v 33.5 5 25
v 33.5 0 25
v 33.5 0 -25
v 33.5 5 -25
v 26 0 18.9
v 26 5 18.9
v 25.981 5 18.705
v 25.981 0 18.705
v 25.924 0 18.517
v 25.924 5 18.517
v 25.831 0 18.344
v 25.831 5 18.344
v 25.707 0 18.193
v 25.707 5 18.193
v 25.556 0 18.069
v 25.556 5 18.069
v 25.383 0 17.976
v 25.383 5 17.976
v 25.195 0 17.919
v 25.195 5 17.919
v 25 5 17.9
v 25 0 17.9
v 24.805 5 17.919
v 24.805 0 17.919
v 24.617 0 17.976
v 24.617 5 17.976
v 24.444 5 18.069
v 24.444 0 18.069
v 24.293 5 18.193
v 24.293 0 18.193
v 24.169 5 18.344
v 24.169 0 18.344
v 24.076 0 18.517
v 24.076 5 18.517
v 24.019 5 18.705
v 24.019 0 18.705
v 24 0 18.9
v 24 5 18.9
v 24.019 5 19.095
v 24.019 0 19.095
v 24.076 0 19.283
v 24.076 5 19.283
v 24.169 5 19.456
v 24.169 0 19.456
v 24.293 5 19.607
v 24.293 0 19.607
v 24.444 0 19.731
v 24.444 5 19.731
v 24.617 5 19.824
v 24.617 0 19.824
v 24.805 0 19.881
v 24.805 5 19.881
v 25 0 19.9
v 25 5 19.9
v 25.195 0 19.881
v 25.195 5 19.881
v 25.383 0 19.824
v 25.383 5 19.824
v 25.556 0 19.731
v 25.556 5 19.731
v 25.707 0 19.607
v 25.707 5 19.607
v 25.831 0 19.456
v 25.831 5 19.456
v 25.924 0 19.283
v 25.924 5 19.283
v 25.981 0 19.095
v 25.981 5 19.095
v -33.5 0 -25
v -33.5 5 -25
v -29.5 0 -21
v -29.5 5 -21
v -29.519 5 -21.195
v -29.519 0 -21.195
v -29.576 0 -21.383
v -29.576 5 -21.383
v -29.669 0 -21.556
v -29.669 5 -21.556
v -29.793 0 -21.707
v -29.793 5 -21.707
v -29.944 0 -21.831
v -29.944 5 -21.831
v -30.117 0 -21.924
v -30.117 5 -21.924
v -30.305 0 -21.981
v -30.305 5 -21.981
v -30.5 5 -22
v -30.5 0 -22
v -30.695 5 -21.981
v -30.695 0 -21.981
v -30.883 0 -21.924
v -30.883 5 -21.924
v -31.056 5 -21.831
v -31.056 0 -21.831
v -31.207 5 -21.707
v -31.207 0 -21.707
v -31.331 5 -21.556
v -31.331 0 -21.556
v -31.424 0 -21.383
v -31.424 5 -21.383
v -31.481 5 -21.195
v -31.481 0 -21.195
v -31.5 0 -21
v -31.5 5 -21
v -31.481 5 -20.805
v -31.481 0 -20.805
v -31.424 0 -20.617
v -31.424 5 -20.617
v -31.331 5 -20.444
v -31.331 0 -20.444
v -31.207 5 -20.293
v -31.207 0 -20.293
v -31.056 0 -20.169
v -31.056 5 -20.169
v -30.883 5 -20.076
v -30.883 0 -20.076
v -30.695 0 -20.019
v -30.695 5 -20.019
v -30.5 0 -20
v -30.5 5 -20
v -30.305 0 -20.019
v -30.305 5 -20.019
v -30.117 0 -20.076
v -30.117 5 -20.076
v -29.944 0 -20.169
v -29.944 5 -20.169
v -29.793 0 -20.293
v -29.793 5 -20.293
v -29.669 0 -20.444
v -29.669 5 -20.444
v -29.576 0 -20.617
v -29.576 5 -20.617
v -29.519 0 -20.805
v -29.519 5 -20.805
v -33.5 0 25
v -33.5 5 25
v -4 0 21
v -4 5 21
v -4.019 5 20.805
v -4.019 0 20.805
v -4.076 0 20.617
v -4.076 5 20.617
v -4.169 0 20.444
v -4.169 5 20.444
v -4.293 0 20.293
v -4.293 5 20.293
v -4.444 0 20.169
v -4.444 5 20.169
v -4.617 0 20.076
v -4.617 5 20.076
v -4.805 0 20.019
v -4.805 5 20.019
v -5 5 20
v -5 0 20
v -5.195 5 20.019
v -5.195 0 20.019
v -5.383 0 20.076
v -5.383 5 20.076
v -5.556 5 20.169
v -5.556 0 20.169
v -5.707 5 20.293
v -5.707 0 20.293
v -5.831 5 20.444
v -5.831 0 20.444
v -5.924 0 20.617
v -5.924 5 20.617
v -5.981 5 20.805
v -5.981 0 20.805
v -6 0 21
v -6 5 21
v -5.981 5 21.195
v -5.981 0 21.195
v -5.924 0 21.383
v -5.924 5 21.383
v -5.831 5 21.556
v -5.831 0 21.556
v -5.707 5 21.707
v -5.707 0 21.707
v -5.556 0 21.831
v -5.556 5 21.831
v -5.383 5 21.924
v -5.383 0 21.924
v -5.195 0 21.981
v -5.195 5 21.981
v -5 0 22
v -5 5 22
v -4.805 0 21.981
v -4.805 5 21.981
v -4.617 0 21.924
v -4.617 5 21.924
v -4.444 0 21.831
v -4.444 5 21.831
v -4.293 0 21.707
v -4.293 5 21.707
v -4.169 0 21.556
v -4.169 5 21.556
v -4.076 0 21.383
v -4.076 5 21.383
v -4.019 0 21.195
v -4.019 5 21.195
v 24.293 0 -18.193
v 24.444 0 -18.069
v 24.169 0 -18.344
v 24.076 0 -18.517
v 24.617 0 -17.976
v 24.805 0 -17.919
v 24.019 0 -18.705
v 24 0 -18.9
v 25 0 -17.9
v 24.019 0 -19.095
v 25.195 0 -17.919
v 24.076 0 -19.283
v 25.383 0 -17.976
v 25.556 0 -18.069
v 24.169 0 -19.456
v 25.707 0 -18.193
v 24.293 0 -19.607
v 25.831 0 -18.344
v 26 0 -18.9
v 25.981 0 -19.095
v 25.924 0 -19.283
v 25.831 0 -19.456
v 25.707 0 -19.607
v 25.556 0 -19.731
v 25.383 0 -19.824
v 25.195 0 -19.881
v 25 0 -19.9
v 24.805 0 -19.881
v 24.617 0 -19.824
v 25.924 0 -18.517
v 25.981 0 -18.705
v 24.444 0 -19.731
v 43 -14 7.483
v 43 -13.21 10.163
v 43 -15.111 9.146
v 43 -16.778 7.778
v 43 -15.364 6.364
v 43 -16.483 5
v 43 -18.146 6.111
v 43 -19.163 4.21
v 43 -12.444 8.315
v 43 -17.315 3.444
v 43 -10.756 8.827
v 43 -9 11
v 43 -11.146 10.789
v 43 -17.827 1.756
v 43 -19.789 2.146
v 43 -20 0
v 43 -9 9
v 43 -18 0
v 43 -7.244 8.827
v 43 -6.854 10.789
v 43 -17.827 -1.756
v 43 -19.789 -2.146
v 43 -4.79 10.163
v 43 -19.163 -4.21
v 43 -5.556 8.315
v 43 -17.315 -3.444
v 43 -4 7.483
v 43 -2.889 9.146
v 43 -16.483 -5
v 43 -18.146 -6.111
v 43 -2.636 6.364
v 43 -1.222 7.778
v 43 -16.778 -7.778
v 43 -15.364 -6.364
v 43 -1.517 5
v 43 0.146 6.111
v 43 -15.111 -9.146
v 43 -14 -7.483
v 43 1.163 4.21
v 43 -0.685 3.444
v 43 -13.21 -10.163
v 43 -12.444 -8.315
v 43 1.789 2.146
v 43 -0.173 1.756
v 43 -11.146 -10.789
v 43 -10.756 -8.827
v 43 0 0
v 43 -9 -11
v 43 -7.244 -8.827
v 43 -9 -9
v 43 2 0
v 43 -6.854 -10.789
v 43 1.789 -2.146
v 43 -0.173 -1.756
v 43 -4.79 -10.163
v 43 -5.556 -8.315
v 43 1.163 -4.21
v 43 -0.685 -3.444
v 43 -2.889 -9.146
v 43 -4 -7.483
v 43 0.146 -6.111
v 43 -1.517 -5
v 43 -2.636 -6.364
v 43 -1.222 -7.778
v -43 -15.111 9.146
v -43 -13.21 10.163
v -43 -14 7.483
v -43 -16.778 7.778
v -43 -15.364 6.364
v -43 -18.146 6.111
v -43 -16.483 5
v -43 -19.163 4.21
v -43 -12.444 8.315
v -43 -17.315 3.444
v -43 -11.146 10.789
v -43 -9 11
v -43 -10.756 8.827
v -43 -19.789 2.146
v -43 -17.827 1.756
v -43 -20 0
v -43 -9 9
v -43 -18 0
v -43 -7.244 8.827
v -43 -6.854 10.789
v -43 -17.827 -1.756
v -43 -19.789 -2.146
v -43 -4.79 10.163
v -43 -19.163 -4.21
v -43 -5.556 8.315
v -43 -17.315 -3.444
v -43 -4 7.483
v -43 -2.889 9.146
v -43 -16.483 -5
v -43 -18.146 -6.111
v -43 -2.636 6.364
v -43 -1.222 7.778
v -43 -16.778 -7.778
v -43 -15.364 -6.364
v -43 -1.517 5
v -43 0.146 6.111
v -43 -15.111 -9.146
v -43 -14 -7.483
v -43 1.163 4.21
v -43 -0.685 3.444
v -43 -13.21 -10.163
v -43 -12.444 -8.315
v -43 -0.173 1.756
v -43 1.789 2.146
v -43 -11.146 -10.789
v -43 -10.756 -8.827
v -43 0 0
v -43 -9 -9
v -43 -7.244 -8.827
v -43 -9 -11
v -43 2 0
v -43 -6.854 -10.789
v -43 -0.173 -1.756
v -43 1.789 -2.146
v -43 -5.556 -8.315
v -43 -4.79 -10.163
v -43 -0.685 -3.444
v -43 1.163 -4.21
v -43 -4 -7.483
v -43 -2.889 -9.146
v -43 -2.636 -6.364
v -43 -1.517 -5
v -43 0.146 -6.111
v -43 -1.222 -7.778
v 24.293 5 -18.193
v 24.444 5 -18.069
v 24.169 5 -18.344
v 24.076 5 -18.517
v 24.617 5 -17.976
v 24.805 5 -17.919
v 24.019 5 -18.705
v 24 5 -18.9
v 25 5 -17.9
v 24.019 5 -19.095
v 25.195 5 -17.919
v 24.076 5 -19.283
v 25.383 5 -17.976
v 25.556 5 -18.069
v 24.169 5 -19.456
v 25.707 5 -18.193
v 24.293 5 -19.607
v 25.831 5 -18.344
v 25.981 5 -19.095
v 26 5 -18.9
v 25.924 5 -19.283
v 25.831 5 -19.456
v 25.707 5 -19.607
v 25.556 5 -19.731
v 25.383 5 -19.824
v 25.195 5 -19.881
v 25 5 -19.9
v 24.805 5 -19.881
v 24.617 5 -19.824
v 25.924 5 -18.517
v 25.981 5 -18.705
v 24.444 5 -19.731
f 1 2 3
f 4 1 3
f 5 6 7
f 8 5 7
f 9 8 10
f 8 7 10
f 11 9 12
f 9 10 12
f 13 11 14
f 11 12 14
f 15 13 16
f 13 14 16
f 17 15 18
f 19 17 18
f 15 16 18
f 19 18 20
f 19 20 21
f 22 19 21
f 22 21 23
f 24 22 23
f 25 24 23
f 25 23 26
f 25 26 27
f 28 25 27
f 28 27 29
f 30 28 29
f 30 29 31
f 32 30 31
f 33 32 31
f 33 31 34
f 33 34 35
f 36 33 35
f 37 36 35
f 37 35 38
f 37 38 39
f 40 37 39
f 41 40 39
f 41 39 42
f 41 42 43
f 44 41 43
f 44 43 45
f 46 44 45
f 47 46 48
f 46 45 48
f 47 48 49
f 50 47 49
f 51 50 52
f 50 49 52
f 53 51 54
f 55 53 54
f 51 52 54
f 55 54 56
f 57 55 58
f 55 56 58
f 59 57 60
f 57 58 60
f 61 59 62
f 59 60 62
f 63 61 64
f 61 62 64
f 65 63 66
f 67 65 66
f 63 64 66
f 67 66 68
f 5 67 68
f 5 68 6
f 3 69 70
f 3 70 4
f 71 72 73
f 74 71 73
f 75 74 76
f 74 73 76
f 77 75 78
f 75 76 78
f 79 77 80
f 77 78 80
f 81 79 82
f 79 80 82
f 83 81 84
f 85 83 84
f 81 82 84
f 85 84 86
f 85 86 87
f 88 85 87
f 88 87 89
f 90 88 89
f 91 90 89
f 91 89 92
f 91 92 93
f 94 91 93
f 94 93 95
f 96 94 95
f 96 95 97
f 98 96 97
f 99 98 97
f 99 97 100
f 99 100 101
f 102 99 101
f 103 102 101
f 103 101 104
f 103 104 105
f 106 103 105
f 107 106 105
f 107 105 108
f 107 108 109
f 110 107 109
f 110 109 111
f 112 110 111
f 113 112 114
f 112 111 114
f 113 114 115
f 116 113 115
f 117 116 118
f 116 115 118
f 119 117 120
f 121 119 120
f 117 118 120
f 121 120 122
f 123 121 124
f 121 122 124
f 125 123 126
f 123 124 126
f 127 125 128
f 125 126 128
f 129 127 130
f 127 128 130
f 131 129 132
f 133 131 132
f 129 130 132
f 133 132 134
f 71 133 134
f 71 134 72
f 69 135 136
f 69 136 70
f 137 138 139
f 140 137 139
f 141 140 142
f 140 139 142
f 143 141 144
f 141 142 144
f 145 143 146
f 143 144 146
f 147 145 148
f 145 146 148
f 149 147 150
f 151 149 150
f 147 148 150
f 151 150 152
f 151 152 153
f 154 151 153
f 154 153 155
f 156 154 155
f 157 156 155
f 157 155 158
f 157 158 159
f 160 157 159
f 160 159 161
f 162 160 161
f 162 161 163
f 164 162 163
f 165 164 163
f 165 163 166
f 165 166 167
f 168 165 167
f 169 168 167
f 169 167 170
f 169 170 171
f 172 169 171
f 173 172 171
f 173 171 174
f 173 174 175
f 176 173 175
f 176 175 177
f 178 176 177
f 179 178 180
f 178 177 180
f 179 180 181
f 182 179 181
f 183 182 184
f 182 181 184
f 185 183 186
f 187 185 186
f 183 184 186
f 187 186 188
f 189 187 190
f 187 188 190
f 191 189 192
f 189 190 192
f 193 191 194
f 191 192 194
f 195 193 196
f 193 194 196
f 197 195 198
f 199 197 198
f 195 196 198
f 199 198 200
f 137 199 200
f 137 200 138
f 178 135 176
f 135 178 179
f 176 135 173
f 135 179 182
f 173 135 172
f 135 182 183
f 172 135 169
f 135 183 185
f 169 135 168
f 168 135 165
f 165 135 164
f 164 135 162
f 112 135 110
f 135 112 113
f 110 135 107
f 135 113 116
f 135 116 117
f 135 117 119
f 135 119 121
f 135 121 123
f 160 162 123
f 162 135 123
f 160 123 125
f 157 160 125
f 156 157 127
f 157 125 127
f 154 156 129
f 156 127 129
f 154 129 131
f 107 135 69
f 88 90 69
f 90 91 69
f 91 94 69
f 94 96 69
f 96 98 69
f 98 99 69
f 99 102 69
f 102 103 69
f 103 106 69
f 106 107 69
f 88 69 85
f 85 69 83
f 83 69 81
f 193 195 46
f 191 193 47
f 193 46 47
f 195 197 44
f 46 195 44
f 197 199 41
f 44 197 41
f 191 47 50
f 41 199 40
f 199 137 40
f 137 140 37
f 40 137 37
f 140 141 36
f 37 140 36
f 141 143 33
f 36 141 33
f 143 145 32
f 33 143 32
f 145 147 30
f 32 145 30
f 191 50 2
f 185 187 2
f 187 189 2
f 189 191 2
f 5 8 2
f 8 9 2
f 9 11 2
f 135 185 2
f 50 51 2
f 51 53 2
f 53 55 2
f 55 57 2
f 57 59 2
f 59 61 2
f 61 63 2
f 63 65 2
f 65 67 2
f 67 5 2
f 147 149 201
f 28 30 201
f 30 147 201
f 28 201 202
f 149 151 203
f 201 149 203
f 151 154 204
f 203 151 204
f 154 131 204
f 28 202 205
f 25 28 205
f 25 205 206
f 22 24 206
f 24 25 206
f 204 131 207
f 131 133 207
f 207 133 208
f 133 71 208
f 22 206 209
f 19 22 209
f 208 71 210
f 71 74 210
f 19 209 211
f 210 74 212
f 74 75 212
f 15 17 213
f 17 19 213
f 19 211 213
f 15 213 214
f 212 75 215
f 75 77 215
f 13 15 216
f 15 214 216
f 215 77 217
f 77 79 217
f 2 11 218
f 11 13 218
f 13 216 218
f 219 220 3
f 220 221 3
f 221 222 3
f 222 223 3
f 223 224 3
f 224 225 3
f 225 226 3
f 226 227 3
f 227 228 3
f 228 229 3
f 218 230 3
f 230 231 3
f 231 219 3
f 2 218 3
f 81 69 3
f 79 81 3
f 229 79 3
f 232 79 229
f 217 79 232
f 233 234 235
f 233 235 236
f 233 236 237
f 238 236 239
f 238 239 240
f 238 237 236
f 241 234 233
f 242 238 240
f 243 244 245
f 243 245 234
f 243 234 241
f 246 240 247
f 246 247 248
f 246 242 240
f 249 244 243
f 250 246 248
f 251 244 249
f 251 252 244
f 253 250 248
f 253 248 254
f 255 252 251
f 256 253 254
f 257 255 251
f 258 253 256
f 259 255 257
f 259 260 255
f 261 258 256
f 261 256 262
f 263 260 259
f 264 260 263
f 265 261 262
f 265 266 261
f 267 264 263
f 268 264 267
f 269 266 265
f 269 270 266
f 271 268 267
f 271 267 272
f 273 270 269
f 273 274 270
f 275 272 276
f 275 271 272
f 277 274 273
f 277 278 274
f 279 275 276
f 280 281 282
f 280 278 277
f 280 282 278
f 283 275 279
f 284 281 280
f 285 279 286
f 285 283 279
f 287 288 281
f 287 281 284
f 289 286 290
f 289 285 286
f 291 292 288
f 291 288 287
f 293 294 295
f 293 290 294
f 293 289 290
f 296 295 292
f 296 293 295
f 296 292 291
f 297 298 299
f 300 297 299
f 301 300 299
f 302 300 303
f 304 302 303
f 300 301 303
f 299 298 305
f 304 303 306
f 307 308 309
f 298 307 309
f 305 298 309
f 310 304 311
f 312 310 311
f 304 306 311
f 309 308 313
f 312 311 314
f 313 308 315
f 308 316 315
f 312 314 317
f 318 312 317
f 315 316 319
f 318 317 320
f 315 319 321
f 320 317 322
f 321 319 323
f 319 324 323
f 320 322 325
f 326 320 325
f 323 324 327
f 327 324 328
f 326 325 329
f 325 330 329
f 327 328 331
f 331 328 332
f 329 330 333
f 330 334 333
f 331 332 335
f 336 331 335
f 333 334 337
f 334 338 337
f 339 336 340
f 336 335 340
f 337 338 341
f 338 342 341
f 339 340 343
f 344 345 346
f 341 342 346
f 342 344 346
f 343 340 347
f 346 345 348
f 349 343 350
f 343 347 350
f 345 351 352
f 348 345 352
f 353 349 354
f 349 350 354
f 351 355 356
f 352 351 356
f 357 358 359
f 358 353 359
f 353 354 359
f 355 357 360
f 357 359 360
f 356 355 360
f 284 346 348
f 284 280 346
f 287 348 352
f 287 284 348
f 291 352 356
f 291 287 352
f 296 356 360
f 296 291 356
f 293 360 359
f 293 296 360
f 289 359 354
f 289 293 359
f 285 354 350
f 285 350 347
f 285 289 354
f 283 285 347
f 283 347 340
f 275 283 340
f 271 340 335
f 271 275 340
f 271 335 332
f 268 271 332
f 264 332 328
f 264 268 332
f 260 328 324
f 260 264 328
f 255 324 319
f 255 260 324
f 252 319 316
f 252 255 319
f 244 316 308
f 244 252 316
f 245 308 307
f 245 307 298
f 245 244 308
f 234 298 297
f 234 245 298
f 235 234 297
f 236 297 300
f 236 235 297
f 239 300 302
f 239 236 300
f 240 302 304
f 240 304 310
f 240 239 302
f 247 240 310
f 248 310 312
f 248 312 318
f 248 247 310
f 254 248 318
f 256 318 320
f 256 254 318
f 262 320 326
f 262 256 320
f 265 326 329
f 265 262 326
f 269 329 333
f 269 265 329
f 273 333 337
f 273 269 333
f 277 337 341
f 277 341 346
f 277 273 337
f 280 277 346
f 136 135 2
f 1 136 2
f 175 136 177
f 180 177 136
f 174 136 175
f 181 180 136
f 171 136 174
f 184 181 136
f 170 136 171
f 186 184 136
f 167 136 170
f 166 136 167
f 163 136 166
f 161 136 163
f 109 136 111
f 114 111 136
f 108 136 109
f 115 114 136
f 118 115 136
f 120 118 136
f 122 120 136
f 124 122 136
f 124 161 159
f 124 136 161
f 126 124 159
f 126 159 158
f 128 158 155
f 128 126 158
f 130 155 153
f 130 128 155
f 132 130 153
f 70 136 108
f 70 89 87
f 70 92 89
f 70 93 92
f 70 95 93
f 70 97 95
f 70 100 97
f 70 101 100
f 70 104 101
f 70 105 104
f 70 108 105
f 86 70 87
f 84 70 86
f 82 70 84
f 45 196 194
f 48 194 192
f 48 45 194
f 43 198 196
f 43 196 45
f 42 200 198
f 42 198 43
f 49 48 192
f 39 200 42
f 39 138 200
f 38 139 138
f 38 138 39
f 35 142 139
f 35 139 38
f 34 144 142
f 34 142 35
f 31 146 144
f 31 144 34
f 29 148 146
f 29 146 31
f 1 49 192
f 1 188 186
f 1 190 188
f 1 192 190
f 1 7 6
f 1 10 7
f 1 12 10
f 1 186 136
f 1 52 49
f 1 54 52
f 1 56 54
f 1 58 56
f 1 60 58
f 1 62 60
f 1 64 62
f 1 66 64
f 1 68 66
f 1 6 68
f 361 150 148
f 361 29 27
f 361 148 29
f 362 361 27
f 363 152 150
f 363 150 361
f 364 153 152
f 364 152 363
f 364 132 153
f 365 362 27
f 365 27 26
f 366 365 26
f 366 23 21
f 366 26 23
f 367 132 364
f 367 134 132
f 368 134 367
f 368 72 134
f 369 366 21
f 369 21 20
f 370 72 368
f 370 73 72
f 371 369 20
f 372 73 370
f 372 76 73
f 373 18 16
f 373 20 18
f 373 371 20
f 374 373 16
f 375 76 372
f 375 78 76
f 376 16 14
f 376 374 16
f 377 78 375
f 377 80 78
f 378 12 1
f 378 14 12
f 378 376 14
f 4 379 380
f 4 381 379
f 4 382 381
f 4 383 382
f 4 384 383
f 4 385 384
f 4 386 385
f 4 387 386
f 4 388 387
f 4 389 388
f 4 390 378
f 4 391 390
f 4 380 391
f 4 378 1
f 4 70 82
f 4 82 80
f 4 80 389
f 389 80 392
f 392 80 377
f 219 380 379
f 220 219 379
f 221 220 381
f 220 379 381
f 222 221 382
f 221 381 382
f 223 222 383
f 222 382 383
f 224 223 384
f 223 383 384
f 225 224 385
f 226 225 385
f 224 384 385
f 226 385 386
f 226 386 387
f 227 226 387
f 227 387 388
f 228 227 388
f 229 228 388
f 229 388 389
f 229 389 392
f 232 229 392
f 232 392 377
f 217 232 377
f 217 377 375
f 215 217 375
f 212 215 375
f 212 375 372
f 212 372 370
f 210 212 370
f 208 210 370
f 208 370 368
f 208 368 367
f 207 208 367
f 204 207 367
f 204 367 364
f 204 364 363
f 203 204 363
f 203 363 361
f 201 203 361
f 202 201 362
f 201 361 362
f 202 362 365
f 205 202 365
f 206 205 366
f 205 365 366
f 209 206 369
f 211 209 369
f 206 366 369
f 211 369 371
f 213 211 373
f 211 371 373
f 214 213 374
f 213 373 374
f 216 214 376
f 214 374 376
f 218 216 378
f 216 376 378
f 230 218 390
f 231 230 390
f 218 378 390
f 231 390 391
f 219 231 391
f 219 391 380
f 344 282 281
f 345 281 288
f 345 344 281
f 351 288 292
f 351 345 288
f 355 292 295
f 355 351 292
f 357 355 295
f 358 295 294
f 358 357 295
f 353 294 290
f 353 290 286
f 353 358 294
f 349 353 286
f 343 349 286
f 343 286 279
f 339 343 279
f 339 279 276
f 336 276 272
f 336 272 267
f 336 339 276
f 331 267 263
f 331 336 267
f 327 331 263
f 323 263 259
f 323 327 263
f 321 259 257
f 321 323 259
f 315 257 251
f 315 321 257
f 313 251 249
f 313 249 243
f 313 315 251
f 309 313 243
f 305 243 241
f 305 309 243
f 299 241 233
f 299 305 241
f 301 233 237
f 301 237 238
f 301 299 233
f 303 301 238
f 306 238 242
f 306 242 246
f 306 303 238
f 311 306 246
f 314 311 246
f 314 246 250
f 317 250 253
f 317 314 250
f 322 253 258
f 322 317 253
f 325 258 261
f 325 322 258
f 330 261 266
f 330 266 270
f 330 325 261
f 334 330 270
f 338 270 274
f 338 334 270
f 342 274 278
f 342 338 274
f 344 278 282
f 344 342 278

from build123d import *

# Parameters (mm, degrees)
SKETCH_1_W          = 67
SKETCH_1_H          = 50
EXTRUDE_1_DEPTH     = 5
SKETCH_2_R          = 1
CUT_EXTRUDE_1_DEPTH = 6
SKETCH_4_R          = 11
SKETCH_4_R_2        = 9
EXTRUDE_2_DEPTH     = 43


with BuildPart() as part:
    # 草图1 → 凸台-拉伸1 (new body)
    with BuildSketch(Plane(origin=(0, 0, 0), x_dir=(1, 0, 0), z_dir=(0, 1, 0))):
        Rectangle(SKETCH_1_W, SKETCH_1_H)
    extrude(amount=EXTRUDE_1_DEPTH)

    # 草图2 → 切除-拉伸1 (cut, through all)
    with BuildSketch(Plane(origin=(0, 5, 0), x_dir=(1, 0, 0), z_dir=(0, 1, 0))):
        with Locations((-5, -21)):
            Circle(SKETCH_2_R)
        with Locations((25, -18.9)):
            Circle(SKETCH_2_R)
        with Locations((25, 18.9)):
            Circle(SKETCH_2_R)
        with Locations((-30.5, 21)):
            Circle(SKETCH_2_R)
    extrude(amount=-CUT_EXTRUDE_1_DEPTH, mode=Mode.SUBTRACT)


with BuildPart() as body_2:
    # 草图4 → 凸台-拉伸2 (new body, symmetric)
    with BuildSketch(Plane(origin=(0, 0, 0), x_dir=(0, 0, -1), z_dir=(1, 0, 0))):
        with Locations((0, -9)):
            Circle(SKETCH_4_R)
        with Locations((0, -9)):
            Circle(SKETCH_4_R_2, mode=Mode.SUBTRACT)
    extrude(amount=EXTRUDE_2_DEPTH, both=True)


solid = Compound([part.part, body_2.part])
